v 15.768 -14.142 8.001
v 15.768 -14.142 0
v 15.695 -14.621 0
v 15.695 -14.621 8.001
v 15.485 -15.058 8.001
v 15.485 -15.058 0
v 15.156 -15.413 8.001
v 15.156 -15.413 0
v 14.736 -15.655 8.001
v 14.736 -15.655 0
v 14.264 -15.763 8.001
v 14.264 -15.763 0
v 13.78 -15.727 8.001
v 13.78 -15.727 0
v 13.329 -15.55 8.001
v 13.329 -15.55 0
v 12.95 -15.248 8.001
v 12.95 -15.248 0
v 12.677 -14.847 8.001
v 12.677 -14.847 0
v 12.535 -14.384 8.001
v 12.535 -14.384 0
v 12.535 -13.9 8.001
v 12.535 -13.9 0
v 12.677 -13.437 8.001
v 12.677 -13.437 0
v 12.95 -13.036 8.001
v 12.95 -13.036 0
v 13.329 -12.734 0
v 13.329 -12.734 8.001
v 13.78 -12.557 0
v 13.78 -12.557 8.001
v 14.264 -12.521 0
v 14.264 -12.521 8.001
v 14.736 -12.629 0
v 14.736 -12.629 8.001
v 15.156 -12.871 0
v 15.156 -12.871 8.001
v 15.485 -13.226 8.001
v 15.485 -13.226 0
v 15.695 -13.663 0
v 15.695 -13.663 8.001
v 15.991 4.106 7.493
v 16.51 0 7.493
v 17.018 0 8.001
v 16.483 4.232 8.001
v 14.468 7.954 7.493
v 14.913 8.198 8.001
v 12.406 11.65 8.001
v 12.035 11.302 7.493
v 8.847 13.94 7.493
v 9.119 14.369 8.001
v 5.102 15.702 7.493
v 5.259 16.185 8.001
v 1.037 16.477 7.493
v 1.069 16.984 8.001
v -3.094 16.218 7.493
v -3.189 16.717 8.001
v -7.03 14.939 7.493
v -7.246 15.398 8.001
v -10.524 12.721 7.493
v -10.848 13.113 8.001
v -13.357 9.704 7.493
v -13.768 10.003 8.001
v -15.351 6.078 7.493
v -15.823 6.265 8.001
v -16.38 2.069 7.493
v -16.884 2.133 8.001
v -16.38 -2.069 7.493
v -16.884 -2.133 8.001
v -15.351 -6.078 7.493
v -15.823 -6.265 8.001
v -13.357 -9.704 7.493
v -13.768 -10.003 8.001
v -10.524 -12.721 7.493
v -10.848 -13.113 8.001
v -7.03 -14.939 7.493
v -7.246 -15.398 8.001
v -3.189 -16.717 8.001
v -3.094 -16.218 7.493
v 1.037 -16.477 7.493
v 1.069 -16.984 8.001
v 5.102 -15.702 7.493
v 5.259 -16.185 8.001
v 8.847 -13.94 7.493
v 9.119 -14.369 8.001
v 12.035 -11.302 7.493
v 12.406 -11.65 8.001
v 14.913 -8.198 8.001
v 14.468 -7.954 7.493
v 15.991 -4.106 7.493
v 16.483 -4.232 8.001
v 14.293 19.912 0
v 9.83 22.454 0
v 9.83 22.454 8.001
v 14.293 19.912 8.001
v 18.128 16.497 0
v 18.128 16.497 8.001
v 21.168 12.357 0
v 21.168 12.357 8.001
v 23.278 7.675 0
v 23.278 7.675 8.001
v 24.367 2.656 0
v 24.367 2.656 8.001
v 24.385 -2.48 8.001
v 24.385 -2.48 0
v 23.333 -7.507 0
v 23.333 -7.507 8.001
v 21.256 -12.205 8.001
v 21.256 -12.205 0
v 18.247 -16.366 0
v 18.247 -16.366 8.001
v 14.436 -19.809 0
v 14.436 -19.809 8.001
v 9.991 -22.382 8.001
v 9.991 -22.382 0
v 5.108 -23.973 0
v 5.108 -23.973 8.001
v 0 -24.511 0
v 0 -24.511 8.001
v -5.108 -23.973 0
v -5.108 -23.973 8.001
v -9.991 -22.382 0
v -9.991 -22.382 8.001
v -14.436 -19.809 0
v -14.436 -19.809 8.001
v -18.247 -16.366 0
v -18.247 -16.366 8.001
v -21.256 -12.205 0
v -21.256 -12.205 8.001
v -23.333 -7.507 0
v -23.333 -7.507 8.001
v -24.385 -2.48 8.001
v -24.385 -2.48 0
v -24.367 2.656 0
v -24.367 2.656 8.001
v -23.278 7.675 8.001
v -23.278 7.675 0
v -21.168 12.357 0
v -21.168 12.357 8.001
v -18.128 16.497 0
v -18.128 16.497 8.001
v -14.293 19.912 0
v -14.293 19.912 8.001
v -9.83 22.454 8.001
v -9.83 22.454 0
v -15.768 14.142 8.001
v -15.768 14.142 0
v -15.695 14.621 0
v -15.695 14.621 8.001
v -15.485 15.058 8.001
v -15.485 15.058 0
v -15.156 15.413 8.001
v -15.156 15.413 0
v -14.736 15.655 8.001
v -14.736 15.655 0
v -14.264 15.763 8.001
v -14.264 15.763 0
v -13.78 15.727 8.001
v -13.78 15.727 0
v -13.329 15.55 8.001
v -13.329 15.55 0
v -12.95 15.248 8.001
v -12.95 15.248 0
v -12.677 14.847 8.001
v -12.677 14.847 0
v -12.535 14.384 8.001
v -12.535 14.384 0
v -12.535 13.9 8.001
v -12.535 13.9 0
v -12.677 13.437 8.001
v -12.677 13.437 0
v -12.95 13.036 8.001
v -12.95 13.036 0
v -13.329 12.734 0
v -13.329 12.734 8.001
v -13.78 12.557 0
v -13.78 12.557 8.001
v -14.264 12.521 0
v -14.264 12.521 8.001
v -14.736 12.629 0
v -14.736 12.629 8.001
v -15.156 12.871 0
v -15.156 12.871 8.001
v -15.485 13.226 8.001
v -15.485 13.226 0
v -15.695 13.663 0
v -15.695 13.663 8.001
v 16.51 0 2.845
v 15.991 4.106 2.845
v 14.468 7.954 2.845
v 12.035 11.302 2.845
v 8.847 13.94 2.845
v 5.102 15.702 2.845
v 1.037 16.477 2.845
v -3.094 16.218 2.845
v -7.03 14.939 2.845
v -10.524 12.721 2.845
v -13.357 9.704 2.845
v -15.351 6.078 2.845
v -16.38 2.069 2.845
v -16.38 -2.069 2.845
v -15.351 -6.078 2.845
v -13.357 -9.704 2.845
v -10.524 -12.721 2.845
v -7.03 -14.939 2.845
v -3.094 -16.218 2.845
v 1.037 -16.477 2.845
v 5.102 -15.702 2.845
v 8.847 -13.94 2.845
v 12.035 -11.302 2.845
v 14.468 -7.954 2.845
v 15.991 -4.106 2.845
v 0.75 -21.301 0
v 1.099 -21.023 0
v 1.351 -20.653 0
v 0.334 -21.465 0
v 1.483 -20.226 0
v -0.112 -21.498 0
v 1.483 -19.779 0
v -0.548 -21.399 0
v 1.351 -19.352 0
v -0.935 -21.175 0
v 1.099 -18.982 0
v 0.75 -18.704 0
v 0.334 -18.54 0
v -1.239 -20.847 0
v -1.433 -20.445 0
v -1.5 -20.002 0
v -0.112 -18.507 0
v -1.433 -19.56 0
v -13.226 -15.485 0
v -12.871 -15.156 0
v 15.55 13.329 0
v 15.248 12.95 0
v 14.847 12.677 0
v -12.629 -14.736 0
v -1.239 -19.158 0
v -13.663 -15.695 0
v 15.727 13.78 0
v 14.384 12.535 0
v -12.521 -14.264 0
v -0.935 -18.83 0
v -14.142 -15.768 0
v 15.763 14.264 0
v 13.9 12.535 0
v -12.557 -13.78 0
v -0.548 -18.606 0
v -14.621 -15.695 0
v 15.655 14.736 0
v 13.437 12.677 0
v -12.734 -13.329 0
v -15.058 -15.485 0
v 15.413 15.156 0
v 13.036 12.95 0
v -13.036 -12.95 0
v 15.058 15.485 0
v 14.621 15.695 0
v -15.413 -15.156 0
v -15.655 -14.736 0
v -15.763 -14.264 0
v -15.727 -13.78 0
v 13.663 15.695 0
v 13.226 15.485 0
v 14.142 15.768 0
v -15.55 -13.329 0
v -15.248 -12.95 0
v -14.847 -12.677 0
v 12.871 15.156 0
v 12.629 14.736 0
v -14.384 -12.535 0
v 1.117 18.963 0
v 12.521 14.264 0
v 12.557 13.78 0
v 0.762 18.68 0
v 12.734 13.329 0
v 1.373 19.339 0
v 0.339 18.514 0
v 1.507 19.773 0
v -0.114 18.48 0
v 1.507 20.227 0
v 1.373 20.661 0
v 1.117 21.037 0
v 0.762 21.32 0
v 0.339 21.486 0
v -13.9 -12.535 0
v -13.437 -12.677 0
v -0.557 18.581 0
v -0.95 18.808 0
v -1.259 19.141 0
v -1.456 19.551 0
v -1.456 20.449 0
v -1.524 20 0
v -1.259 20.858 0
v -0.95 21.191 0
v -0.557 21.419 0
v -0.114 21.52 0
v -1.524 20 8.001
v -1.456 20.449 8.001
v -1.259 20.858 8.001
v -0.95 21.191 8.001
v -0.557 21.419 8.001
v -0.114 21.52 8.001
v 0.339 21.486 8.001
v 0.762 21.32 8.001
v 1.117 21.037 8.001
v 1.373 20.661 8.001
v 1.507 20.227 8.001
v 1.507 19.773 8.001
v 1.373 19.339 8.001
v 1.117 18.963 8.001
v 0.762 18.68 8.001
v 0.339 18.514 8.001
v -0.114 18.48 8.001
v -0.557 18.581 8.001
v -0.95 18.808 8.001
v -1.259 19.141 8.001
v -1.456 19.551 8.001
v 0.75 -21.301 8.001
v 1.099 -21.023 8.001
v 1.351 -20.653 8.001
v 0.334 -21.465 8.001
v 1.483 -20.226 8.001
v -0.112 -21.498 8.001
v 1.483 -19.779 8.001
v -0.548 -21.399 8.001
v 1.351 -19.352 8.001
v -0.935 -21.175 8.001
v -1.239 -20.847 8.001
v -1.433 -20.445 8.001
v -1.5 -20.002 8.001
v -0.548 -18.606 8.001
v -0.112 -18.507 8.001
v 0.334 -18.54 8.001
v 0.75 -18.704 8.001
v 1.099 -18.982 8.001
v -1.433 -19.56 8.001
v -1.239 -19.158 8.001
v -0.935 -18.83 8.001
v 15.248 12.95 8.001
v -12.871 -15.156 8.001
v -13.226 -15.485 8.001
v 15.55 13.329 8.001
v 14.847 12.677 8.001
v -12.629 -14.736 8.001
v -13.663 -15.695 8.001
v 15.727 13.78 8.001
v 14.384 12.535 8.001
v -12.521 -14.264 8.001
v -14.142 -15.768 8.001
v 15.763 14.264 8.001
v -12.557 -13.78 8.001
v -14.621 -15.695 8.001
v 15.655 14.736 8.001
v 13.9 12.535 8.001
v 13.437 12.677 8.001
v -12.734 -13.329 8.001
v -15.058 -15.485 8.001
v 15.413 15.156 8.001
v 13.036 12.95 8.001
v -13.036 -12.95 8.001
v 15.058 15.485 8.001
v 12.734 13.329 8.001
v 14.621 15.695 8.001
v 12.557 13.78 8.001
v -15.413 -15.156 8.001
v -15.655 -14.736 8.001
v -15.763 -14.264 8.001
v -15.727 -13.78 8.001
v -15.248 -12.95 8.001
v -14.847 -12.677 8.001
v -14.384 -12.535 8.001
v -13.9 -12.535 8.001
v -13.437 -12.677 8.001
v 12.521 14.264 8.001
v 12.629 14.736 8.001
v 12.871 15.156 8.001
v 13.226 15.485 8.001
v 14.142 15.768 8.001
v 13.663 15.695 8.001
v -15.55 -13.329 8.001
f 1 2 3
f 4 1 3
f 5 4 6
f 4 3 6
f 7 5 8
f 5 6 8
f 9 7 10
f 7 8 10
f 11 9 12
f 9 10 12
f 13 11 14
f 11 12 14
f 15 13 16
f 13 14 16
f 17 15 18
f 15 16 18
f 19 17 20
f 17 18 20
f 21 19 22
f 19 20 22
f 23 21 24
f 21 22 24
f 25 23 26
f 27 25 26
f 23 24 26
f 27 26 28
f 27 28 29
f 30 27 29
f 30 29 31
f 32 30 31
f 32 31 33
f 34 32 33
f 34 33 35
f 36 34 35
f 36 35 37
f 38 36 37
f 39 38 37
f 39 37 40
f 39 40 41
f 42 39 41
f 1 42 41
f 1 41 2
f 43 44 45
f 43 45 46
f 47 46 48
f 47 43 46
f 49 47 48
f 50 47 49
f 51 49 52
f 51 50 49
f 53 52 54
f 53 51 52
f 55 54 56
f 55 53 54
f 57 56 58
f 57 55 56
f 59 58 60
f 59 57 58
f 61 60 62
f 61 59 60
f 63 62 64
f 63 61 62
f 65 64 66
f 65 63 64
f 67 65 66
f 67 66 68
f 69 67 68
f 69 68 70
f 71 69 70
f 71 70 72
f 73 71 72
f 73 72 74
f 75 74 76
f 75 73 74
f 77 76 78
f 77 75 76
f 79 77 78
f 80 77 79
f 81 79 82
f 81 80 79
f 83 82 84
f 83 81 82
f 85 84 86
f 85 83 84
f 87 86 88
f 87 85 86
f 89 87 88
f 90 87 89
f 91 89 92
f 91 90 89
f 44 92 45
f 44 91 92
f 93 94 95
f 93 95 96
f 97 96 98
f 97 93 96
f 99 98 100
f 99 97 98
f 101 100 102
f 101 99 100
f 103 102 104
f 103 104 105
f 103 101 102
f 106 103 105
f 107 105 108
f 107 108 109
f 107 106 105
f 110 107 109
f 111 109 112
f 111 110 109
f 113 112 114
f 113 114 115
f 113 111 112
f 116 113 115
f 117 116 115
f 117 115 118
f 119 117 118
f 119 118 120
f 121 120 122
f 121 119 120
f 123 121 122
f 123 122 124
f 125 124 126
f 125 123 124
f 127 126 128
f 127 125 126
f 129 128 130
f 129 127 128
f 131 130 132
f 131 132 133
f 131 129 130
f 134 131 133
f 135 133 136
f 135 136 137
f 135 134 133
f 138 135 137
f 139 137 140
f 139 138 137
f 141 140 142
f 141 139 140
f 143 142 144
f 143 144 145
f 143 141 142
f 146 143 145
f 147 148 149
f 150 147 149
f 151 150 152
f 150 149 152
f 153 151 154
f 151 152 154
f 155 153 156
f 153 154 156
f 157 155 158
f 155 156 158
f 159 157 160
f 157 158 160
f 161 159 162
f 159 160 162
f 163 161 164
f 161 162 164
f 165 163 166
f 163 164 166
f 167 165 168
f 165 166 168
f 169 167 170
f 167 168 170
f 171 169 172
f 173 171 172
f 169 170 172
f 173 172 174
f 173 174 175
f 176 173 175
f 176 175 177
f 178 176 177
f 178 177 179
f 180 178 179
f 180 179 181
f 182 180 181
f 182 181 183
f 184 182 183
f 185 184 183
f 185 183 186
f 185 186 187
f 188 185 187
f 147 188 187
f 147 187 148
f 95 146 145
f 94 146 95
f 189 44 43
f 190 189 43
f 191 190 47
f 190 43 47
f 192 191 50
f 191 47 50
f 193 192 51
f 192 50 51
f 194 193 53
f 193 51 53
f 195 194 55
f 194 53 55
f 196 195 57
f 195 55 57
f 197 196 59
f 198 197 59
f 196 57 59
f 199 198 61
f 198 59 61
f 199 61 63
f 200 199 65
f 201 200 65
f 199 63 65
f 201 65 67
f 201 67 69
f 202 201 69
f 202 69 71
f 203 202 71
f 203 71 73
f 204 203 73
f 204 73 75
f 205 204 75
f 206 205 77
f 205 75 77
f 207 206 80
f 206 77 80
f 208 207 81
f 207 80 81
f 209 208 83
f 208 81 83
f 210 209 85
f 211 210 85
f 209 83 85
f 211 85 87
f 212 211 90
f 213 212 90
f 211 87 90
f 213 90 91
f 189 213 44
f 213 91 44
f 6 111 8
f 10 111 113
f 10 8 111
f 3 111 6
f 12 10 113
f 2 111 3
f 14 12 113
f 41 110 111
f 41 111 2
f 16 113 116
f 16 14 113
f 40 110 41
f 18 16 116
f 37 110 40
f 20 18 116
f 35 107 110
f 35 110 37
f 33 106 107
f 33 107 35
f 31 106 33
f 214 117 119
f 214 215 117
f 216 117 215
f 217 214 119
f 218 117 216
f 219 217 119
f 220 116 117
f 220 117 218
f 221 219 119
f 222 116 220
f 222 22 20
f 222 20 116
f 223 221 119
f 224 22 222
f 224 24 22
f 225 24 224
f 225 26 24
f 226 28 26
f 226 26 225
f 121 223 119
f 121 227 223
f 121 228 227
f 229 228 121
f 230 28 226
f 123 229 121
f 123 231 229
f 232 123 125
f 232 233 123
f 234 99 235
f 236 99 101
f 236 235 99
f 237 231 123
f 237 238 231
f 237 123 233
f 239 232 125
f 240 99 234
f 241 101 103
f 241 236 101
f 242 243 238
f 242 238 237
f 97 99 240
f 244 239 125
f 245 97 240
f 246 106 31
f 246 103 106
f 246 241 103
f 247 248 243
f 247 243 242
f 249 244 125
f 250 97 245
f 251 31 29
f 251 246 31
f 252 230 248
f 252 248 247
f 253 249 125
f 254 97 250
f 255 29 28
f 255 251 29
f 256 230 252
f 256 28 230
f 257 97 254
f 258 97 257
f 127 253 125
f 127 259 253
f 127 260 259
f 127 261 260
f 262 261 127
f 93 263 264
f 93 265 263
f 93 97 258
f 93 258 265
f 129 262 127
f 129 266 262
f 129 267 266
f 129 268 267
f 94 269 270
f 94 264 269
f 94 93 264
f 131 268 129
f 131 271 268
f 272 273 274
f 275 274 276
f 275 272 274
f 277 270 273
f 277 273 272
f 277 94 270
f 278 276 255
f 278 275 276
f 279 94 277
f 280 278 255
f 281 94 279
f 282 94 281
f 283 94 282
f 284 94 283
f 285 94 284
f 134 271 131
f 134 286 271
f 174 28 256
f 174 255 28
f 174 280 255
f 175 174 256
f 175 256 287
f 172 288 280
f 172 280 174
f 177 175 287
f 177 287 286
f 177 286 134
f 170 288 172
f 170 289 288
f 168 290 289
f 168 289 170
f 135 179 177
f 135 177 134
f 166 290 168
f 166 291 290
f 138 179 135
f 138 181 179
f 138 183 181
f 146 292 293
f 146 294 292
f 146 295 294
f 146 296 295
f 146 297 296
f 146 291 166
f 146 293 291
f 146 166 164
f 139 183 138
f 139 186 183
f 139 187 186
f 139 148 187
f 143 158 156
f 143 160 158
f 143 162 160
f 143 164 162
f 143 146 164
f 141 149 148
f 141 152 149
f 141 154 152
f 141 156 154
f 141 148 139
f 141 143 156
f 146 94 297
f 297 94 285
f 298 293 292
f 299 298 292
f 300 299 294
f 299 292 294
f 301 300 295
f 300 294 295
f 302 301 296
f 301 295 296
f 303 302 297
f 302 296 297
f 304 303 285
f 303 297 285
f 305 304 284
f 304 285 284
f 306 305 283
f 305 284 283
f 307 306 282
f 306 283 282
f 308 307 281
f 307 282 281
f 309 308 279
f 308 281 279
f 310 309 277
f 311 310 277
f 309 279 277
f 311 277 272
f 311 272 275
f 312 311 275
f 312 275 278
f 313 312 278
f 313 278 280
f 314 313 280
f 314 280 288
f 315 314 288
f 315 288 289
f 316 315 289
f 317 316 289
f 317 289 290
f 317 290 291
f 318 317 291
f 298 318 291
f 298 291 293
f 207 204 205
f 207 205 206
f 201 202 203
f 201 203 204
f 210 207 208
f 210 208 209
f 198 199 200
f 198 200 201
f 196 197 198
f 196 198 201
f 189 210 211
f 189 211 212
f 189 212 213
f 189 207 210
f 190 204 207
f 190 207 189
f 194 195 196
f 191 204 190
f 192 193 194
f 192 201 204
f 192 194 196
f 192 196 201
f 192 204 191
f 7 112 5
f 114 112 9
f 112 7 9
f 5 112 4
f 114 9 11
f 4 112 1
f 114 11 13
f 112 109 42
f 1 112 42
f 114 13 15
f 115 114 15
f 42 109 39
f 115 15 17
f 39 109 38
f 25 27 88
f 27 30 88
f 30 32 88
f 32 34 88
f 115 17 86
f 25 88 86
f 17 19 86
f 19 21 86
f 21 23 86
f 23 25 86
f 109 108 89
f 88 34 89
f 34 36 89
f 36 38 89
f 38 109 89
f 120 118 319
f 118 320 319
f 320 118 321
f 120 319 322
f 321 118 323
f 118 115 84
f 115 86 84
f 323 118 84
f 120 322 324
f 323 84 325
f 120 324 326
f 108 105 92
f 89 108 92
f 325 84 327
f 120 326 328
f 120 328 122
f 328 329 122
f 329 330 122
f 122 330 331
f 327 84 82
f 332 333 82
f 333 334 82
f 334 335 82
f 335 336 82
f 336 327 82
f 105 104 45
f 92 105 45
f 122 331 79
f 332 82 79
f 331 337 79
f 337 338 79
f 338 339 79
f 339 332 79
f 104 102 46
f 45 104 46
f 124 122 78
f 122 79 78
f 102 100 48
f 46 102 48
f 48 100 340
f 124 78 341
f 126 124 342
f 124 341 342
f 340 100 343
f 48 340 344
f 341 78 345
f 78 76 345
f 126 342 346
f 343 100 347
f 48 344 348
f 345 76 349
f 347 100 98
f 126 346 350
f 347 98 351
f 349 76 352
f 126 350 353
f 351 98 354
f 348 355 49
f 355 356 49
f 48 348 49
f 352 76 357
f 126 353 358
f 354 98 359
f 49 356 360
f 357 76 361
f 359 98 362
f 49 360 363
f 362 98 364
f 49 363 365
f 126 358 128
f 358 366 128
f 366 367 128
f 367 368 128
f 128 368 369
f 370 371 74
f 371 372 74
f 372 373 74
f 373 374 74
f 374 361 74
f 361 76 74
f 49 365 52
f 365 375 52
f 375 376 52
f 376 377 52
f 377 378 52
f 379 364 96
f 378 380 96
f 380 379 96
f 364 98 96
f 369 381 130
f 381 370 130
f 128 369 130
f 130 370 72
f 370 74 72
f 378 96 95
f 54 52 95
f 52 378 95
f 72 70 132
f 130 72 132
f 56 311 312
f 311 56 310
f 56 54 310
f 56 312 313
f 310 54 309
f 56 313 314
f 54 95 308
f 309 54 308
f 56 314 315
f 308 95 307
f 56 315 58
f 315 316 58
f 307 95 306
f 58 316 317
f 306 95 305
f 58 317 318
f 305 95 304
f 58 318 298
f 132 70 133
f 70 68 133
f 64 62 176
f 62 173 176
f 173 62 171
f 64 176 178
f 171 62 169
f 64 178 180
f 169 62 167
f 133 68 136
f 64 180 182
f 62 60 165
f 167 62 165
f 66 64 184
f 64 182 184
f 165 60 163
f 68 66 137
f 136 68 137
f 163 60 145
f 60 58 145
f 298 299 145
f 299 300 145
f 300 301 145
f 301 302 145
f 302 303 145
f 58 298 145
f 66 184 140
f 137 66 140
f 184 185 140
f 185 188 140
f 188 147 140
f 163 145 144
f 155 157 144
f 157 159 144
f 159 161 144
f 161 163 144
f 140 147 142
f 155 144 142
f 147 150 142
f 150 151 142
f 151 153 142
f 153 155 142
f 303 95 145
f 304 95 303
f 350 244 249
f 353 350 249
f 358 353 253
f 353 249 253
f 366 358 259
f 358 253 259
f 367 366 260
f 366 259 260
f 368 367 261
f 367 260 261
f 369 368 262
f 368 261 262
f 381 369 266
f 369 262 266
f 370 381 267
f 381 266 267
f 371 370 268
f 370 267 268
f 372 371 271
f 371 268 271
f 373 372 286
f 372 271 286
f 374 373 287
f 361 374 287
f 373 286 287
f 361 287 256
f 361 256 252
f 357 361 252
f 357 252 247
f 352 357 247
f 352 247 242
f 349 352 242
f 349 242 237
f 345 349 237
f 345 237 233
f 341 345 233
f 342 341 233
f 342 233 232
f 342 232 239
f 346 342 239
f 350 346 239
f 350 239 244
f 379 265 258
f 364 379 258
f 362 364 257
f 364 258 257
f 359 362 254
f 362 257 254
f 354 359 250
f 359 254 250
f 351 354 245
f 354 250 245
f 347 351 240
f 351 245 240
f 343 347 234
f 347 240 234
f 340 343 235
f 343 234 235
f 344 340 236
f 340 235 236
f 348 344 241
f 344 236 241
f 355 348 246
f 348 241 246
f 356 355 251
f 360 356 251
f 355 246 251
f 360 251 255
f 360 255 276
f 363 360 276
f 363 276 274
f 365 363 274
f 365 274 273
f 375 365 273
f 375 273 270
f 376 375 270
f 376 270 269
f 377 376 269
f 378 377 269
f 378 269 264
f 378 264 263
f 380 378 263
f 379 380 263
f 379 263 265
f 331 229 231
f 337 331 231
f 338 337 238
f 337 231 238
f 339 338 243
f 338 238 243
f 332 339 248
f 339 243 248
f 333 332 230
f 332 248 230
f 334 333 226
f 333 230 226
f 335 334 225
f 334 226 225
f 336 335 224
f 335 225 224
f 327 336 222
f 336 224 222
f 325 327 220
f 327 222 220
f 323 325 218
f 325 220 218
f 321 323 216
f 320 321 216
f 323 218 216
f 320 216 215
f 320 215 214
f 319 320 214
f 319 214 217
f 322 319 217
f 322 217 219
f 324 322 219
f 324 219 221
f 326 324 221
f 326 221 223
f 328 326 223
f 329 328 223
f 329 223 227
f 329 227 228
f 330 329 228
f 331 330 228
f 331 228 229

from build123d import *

# Parameters (mm, degrees)
BASE_EXTRUDE_DEPTH = 8.001
HOLE1_D            = 3.048
HOLE2_D            = 3.2512
CIRPATTERN1_COUNT  = 4
HOLE3_D            = 2.99974
SKETCH8_R          = 16.51
CUT_EXTRUDE1_DEPTH = 5.1562
CHAMFER1_SIZE      = 0.508


with BuildPart() as part:
    # Sketch1 → Base-Extrude (new body)
    with BuildSketch(Plane.XY):
        with BuildLine():
            Line((-9.8298, 22.4536), (9.8298, 22.4536))
            ThreePointArc((9.8298, 22.4536), (0, -24.511), (-9.8298, 22.4536))
        make_face()
    extrude(amount=BASE_EXTRUDE_DEPTH)

    # Hole1 (through all)
    with Locations(Plane.XY.offset(8.001)):
        with Locations((0, 19.99996)):
            Hole(HOLE1_D / 2)

    # Hole2 (through all)
    with Locations(Plane.XY.offset(8.001)):
        with Locations((-14.142107339, 14.142107339)):
            hole2 = Hole(HOLE2_D / 2)

    # CirPattern1: Hole2 ×4 about axis
    cirpattern1_axis = Axis((0, 0, 0), (0, 0, 1))
    for i in range(1, CIRPATTERN1_COUNT):
        add(hole2.rotate(cirpattern1_axis, i * 360 / CIRPATTERN1_COUNT), mode=Mode.SUBTRACT)

    # Hole3 (through all)
    with Locations(Plane.XY.offset(8.001)):
        with Locations((0, -20.0025)):
            Hole(HOLE3_D / 2)

    # Sketch8 → Cut-Extrude1 (cut)
    with BuildSketch(Plane.XY.offset(8.001)):
        Circle(SKETCH8_R)
    extrude(amount=-CUT_EXTRUDE1_DEPTH, mode=Mode.SUBTRACT)

    # Chamfer1
    chamfer1_edges = [part.edges().sort_by_distance(p)[0] for p in [
        (-16.51, 0, 8.001),
    ]]
    chamfer(chamfer1_edges, length=CHAMFER1_SIZE)


solid = part.part
